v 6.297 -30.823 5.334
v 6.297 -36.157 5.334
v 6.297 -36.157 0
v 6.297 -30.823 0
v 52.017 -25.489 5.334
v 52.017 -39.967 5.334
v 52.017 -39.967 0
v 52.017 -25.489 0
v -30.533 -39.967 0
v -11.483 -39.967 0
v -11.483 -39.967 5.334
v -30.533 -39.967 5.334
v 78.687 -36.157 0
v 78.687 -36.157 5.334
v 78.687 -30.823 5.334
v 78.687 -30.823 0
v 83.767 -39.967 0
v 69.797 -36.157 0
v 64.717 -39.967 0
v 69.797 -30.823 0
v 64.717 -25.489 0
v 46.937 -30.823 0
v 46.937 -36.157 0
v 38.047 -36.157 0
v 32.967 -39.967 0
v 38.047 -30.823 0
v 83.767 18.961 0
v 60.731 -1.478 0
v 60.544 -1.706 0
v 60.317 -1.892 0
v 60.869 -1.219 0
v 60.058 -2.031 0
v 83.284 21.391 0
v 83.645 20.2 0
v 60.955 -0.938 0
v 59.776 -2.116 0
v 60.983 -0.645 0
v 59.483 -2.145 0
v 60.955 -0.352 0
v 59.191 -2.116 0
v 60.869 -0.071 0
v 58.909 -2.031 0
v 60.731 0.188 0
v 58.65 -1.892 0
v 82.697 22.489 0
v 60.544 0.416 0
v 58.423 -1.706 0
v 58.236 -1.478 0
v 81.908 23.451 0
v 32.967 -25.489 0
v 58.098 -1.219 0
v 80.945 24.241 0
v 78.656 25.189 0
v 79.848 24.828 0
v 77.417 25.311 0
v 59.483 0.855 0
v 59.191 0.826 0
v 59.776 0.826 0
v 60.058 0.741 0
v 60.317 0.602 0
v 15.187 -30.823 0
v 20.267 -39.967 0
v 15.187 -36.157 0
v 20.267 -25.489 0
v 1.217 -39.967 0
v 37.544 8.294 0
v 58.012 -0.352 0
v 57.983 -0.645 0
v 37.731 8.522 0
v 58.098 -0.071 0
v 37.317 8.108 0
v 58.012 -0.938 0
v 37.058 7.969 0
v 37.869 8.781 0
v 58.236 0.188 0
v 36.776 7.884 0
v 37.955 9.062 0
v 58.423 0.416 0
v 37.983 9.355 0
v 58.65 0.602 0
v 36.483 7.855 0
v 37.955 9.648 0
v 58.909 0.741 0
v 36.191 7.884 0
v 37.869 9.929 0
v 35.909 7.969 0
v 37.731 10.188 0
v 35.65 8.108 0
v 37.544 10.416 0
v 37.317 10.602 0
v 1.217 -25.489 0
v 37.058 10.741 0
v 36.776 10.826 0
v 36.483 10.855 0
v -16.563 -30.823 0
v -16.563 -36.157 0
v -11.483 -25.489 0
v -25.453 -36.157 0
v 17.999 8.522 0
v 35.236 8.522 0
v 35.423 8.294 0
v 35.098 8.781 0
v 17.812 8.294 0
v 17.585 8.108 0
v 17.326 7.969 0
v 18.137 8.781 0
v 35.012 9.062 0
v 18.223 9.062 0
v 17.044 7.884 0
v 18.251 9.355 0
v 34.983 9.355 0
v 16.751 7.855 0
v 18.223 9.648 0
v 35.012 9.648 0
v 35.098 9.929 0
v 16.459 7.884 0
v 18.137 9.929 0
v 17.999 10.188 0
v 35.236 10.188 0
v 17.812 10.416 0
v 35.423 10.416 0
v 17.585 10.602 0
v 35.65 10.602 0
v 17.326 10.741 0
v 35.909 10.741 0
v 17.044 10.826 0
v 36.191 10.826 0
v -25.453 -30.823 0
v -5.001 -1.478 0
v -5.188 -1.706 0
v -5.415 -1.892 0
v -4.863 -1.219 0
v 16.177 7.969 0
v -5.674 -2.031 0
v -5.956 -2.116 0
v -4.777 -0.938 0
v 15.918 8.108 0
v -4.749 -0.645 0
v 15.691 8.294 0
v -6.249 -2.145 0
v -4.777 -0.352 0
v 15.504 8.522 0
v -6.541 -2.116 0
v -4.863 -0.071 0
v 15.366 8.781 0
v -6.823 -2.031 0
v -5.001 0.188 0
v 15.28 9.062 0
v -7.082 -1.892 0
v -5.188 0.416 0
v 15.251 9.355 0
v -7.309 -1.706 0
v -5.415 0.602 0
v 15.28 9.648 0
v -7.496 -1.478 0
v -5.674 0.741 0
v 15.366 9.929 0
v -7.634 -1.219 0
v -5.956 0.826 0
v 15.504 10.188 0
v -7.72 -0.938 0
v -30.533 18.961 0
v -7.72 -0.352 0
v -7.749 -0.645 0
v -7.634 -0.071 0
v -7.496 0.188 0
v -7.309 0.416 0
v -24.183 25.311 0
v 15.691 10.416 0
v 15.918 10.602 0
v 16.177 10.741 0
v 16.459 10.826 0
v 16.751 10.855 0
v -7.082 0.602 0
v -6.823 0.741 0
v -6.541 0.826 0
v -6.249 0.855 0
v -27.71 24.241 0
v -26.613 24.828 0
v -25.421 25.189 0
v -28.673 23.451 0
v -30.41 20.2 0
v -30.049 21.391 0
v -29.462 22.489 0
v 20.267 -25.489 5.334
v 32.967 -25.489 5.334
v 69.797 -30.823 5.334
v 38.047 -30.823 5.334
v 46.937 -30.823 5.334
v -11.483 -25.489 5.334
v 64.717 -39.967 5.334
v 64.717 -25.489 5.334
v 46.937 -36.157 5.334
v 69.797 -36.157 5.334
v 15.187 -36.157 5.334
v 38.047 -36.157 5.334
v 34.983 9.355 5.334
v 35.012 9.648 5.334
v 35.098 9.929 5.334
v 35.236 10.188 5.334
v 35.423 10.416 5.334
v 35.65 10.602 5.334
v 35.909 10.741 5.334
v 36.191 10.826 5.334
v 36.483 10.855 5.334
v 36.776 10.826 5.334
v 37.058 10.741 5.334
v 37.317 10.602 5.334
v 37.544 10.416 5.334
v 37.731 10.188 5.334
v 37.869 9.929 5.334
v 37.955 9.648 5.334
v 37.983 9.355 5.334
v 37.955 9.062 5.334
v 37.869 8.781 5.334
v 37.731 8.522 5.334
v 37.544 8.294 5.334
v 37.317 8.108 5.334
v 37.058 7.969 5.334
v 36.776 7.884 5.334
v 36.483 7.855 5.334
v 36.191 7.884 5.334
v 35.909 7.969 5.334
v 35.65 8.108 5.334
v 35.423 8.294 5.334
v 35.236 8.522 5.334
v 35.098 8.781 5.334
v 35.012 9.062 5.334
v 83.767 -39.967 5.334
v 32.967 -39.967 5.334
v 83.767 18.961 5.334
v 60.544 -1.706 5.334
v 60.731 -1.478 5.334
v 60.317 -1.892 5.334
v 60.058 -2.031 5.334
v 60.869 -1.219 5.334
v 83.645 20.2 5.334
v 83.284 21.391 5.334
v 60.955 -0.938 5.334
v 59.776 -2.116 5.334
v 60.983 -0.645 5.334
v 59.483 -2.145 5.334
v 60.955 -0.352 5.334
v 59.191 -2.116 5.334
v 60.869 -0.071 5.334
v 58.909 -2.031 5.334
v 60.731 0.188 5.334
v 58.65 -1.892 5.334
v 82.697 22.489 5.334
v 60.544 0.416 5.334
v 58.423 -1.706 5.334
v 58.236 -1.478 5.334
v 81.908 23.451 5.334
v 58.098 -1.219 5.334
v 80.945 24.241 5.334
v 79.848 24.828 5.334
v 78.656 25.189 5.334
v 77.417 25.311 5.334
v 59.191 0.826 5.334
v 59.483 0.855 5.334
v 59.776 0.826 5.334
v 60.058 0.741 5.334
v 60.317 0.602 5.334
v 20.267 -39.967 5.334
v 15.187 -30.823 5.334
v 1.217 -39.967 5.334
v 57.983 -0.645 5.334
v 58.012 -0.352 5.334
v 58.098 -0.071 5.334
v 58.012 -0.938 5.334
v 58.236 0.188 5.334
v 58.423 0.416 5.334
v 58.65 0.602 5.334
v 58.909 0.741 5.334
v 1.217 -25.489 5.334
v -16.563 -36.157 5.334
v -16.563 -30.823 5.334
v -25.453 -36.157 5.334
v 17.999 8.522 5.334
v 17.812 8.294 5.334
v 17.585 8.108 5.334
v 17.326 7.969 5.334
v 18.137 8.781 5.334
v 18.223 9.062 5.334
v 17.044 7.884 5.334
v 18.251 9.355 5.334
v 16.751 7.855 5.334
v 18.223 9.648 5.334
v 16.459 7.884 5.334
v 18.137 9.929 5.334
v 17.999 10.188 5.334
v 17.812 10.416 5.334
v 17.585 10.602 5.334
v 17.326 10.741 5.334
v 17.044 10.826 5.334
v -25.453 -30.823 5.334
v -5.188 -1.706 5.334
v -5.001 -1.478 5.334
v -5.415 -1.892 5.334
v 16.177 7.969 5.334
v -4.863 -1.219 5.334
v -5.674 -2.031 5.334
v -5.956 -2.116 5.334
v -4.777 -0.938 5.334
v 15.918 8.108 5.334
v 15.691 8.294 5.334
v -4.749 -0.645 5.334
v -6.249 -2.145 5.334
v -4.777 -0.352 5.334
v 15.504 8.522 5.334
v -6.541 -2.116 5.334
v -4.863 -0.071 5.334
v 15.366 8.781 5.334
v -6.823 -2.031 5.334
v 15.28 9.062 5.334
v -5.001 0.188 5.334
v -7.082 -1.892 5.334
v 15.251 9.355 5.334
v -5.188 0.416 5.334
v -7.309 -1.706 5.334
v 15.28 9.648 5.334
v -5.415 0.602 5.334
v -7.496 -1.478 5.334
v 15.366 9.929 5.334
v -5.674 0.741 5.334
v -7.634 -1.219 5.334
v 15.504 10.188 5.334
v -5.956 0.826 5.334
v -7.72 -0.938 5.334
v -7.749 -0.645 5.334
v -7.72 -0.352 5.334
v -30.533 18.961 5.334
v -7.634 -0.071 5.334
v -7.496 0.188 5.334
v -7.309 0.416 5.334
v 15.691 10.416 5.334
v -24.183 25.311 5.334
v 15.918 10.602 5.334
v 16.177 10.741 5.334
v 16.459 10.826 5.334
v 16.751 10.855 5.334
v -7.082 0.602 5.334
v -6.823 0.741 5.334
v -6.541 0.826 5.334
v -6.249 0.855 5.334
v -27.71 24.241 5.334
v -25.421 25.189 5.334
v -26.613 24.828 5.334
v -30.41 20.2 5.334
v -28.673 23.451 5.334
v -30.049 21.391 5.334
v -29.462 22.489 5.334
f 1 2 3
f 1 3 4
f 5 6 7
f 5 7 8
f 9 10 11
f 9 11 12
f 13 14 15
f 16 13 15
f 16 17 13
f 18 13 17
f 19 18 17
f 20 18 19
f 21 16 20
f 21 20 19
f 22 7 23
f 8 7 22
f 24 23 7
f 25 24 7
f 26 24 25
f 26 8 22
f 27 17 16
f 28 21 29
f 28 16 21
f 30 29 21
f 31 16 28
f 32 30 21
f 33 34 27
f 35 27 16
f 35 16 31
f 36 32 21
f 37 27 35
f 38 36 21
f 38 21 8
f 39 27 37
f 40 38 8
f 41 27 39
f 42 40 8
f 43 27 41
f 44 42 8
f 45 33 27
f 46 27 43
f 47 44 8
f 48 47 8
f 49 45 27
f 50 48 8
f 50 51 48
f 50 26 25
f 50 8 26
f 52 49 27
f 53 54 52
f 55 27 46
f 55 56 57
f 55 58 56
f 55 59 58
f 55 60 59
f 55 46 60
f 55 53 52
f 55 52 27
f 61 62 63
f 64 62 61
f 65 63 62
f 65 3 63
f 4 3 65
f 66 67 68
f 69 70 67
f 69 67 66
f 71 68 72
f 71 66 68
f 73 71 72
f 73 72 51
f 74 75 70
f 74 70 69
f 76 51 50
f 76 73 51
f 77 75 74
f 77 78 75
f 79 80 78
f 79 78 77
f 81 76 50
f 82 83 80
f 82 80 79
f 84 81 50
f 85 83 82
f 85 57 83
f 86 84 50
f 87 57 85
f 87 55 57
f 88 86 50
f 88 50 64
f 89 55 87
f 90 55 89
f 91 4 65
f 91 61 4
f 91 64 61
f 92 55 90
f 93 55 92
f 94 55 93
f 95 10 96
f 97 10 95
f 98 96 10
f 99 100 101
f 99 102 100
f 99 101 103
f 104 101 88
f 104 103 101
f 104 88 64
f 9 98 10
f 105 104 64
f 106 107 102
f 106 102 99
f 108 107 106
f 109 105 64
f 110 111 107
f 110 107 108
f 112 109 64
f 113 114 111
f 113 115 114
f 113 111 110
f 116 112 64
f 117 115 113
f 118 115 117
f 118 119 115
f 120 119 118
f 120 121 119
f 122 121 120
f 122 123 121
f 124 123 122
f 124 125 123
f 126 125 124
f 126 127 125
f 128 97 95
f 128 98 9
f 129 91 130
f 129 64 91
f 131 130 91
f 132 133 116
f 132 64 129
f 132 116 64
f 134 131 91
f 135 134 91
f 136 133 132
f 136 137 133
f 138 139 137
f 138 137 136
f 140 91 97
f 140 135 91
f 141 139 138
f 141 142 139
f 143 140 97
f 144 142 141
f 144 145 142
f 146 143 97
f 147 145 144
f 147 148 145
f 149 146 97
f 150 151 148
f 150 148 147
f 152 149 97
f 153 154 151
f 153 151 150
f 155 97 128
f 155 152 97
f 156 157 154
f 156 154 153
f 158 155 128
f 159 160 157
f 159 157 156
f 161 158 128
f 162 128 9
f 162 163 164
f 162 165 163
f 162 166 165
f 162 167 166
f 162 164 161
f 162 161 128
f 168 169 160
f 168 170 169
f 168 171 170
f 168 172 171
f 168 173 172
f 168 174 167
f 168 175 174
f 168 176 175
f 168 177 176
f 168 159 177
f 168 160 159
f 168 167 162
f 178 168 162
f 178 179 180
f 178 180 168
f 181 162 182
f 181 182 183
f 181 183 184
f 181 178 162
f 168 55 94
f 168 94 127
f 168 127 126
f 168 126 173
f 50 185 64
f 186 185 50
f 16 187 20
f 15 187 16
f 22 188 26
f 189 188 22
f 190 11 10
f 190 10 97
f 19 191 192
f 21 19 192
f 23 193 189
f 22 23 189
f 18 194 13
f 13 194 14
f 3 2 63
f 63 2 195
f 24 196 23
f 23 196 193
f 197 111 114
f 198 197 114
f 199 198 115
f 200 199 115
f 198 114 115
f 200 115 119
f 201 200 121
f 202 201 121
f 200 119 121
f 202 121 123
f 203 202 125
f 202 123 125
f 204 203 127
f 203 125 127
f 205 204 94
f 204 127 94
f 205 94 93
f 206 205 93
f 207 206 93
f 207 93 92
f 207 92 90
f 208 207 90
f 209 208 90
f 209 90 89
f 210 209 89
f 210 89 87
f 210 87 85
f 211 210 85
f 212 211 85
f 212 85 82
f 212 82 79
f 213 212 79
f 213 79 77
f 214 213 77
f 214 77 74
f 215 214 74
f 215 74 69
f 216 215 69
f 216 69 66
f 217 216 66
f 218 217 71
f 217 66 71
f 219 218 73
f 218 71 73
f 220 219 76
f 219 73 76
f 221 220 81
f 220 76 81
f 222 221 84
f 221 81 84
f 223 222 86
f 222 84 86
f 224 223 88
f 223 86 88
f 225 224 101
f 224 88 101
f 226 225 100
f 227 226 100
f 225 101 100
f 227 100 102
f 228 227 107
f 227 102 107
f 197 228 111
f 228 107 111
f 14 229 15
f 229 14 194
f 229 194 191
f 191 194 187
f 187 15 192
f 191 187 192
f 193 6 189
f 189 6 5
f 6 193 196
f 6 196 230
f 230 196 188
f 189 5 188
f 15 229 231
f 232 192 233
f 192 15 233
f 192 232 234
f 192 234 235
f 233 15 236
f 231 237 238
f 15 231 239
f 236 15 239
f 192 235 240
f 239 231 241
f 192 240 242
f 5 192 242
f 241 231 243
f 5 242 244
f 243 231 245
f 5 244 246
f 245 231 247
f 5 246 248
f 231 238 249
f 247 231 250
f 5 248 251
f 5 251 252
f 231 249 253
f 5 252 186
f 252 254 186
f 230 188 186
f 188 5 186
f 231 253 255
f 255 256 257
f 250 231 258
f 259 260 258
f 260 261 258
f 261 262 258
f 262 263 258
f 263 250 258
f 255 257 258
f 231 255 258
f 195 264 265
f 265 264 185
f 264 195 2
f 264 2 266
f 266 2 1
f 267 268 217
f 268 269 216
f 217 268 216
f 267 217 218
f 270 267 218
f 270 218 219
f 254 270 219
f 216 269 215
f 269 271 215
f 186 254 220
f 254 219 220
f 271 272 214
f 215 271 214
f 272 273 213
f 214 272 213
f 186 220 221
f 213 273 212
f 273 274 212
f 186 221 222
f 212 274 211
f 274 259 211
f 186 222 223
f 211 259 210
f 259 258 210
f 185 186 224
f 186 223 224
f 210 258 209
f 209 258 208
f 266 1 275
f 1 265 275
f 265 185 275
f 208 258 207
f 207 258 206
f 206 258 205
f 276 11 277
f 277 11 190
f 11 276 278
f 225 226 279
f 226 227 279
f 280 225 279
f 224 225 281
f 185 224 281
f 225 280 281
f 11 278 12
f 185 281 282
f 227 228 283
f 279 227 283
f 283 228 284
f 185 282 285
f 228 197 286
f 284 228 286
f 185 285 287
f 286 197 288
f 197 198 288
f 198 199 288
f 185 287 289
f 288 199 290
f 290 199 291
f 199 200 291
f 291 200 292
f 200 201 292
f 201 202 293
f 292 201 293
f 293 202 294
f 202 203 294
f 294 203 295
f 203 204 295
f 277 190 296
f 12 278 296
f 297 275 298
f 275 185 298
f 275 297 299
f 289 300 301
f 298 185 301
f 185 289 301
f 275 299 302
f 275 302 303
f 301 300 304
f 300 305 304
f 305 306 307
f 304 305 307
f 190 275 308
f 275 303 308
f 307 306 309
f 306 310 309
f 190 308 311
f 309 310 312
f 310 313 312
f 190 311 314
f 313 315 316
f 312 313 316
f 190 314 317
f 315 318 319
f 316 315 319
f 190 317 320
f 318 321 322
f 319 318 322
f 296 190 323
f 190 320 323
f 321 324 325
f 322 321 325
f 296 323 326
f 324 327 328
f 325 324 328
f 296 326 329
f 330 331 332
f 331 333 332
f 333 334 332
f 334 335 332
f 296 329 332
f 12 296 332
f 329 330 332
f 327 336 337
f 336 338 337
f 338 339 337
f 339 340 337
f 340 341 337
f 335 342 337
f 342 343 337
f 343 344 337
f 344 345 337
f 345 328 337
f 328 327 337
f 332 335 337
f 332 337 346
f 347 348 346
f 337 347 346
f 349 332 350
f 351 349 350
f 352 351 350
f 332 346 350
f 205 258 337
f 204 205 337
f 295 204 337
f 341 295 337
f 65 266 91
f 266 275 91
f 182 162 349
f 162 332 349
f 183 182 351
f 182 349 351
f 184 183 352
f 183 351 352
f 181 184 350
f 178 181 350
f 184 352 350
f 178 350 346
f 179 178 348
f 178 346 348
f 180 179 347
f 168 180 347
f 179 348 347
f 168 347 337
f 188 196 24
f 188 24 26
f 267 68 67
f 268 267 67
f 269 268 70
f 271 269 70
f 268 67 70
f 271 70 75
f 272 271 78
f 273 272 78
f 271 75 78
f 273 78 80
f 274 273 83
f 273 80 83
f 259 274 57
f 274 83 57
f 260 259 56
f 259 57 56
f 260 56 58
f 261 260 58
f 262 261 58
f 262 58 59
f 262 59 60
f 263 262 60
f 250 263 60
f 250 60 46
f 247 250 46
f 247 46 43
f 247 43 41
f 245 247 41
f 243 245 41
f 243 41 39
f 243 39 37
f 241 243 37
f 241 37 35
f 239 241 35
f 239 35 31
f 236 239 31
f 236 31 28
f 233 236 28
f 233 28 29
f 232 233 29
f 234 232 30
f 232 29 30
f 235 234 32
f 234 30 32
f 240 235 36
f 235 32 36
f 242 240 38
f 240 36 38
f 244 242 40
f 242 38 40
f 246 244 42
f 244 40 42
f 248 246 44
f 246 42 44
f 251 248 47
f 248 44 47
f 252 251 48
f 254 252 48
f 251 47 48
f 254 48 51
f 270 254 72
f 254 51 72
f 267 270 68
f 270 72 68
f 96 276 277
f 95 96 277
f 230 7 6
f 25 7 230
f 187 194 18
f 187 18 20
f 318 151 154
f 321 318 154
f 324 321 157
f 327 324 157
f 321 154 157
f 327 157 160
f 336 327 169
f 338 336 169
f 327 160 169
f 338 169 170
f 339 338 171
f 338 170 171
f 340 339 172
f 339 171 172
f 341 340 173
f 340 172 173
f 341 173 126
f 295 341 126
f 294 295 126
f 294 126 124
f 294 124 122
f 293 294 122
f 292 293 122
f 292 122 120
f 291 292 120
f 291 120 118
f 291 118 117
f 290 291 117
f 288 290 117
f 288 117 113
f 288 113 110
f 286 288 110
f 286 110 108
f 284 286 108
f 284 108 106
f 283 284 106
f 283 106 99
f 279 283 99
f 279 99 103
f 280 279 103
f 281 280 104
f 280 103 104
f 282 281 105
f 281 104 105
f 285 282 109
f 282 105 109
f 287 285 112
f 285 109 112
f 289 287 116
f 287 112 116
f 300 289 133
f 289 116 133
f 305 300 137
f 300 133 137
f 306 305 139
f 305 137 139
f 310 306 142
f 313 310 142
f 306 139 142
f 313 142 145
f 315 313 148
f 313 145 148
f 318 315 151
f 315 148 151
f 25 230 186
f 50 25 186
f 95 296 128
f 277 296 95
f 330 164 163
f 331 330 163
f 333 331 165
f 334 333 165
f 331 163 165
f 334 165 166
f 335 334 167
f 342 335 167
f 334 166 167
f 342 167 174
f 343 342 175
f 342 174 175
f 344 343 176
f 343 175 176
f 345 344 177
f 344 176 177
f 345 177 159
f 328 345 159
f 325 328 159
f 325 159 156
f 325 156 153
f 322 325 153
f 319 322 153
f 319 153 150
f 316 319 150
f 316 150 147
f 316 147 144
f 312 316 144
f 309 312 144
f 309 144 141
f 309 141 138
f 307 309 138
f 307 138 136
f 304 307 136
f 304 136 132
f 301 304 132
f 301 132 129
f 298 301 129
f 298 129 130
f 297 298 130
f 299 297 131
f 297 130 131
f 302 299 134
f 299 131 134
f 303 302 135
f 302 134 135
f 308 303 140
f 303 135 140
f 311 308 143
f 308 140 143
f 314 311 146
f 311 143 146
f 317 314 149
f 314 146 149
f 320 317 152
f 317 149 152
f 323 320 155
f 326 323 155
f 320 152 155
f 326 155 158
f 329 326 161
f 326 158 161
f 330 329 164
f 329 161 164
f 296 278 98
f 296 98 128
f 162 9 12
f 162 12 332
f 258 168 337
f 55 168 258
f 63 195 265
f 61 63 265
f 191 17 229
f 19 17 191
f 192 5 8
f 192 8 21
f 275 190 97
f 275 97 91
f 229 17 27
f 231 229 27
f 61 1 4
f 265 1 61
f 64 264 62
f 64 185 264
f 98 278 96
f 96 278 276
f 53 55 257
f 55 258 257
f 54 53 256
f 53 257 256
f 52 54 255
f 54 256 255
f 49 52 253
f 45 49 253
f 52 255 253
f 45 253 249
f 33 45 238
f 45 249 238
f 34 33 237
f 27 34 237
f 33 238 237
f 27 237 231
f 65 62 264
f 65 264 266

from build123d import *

# Parameters (mm, degrees)
SKETCH1_W           = 114.3
SKETCH1_H           = 56.134
BOSS_EXTRUDE1_DEPTH = 5.334
SKETCH2_W           = 12.7
SKETCH2_H           = 5.334
CUT_EXTRUDE1_DEPTH  = 90.417531181
FILLET1_R           = 6.35
SKETCH3_R           = 1.5
CUT_EXTRUDE2_DEPTH  = 90.417531181
SKETCH4_W           = 19.05
SKETCH4_H           = 5.334
BOSS_EXTRUDE2_DEPTH = 9.144
SKETCH6_W           = 8.89
SKETCH6_H           = 5.334
CUT_EXTRUDE3_DEPTH  = 93.966642796


with BuildPart() as part:
    # Sketch1 → Boss-Extrude1 (new body)
    with BuildSketch(Plane.XY):
        with Locations((26.61749153, -2.755892293)):
            Rectangle(SKETCH1_W, SKETCH1_H)
    extrude(amount=BOSS_EXTRUDE1_DEPTH)

    # Sketch2 → Cut-Extrude1 (cut, through all)
    with BuildSketch(Plane.XY.offset(5.334)):
        with Locations((-5.13250847, -28.155892293)):
            Rectangle(SKETCH2_W, SKETCH2_H)
        with Locations((26.61749153, -28.155892293)):
            Rectangle(SKETCH2_W, SKETCH2_H)
        with Locations((58.36749153, -28.155892293)):
            Rectangle(SKETCH2_W, SKETCH2_H)
    extrude(amount=-CUT_EXTRUDE1_DEPTH, mode=Mode.SUBTRACT)

    # Fillet1
    fillet1_edges = [part.edges().sort_by_distance(p)[0] for p in [
        (-30.53250847, 25.311107707, 2.667),
        (83.76749153, 25.311107707, 2.667),
    ]]
    fillet(fillet1_edges, radius=FILLET1_R)

    # Sketch3 → Cut-Extrude2 (cut, through all)
    with BuildSketch(Plane(origin=(0, 0, 0), x_dir=(-1, 0, 0), z_dir=(0, 0, -1))):
        with Locations((6.24850847, -0.644892293)):
            Circle(SKETCH3_R)
        with Locations((-16.75149153, 9.355107707)):
            Circle(SKETCH3_R)
        with Locations((-59.48349153, -0.644892293)):
            Circle(SKETCH3_R)
        with Locations((-36.48349153, 9.355107707)):
            Circle(SKETCH3_R)
    extrude(amount=-CUT_EXTRUDE2_DEPTH, mode=Mode.SUBTRACT)

    # Sketch4 → Boss-Extrude2 (add)
    with BuildSketch(Plane(origin=(0, -30.822892293, 0), x_dir=(-1, 0, 0), z_dir=(0, -1, 0))):
        with Locations((-10.74249153, -2.667)):
            Rectangle(SKETCH4_W, SKETCH4_H)
        with Locations((21.00750847, -2.667)):
            Rectangle(SKETCH4_W, SKETCH4_H)
        with Locations((-42.49249153, -2.667)):
            Rectangle(SKETCH4_W, SKETCH4_H)
        with Locations((-74.24249153, -2.667)):
            Rectangle(SKETCH4_W, SKETCH4_H)
    extrude(amount=BOSS_EXTRUDE2_DEPTH)

    # Sketch6 → Cut-Extrude3 (cut, through all)
    with BuildSketch(Plane.XY.offset(5.334)):
        with Locations((-21.00750847, -33.489892293)):
            Rectangle(SKETCH6_W, SKETCH6_H)
        with Locations((10.74249153, -33.489892293)):
            Rectangle(SKETCH6_W, SKETCH6_H)
        with Locations((42.49249153, -33.489892293)):
            Rectangle(SKETCH6_W, SKETCH6_H)
        with Locations((74.24249153, -33.489892293)):
            Rectangle(SKETCH6_W, SKETCH6_H)
    extrude(amount=-CUT_EXTRUDE3_DEPTH, mode=Mode.SUBTRACT)


solid = part.part
